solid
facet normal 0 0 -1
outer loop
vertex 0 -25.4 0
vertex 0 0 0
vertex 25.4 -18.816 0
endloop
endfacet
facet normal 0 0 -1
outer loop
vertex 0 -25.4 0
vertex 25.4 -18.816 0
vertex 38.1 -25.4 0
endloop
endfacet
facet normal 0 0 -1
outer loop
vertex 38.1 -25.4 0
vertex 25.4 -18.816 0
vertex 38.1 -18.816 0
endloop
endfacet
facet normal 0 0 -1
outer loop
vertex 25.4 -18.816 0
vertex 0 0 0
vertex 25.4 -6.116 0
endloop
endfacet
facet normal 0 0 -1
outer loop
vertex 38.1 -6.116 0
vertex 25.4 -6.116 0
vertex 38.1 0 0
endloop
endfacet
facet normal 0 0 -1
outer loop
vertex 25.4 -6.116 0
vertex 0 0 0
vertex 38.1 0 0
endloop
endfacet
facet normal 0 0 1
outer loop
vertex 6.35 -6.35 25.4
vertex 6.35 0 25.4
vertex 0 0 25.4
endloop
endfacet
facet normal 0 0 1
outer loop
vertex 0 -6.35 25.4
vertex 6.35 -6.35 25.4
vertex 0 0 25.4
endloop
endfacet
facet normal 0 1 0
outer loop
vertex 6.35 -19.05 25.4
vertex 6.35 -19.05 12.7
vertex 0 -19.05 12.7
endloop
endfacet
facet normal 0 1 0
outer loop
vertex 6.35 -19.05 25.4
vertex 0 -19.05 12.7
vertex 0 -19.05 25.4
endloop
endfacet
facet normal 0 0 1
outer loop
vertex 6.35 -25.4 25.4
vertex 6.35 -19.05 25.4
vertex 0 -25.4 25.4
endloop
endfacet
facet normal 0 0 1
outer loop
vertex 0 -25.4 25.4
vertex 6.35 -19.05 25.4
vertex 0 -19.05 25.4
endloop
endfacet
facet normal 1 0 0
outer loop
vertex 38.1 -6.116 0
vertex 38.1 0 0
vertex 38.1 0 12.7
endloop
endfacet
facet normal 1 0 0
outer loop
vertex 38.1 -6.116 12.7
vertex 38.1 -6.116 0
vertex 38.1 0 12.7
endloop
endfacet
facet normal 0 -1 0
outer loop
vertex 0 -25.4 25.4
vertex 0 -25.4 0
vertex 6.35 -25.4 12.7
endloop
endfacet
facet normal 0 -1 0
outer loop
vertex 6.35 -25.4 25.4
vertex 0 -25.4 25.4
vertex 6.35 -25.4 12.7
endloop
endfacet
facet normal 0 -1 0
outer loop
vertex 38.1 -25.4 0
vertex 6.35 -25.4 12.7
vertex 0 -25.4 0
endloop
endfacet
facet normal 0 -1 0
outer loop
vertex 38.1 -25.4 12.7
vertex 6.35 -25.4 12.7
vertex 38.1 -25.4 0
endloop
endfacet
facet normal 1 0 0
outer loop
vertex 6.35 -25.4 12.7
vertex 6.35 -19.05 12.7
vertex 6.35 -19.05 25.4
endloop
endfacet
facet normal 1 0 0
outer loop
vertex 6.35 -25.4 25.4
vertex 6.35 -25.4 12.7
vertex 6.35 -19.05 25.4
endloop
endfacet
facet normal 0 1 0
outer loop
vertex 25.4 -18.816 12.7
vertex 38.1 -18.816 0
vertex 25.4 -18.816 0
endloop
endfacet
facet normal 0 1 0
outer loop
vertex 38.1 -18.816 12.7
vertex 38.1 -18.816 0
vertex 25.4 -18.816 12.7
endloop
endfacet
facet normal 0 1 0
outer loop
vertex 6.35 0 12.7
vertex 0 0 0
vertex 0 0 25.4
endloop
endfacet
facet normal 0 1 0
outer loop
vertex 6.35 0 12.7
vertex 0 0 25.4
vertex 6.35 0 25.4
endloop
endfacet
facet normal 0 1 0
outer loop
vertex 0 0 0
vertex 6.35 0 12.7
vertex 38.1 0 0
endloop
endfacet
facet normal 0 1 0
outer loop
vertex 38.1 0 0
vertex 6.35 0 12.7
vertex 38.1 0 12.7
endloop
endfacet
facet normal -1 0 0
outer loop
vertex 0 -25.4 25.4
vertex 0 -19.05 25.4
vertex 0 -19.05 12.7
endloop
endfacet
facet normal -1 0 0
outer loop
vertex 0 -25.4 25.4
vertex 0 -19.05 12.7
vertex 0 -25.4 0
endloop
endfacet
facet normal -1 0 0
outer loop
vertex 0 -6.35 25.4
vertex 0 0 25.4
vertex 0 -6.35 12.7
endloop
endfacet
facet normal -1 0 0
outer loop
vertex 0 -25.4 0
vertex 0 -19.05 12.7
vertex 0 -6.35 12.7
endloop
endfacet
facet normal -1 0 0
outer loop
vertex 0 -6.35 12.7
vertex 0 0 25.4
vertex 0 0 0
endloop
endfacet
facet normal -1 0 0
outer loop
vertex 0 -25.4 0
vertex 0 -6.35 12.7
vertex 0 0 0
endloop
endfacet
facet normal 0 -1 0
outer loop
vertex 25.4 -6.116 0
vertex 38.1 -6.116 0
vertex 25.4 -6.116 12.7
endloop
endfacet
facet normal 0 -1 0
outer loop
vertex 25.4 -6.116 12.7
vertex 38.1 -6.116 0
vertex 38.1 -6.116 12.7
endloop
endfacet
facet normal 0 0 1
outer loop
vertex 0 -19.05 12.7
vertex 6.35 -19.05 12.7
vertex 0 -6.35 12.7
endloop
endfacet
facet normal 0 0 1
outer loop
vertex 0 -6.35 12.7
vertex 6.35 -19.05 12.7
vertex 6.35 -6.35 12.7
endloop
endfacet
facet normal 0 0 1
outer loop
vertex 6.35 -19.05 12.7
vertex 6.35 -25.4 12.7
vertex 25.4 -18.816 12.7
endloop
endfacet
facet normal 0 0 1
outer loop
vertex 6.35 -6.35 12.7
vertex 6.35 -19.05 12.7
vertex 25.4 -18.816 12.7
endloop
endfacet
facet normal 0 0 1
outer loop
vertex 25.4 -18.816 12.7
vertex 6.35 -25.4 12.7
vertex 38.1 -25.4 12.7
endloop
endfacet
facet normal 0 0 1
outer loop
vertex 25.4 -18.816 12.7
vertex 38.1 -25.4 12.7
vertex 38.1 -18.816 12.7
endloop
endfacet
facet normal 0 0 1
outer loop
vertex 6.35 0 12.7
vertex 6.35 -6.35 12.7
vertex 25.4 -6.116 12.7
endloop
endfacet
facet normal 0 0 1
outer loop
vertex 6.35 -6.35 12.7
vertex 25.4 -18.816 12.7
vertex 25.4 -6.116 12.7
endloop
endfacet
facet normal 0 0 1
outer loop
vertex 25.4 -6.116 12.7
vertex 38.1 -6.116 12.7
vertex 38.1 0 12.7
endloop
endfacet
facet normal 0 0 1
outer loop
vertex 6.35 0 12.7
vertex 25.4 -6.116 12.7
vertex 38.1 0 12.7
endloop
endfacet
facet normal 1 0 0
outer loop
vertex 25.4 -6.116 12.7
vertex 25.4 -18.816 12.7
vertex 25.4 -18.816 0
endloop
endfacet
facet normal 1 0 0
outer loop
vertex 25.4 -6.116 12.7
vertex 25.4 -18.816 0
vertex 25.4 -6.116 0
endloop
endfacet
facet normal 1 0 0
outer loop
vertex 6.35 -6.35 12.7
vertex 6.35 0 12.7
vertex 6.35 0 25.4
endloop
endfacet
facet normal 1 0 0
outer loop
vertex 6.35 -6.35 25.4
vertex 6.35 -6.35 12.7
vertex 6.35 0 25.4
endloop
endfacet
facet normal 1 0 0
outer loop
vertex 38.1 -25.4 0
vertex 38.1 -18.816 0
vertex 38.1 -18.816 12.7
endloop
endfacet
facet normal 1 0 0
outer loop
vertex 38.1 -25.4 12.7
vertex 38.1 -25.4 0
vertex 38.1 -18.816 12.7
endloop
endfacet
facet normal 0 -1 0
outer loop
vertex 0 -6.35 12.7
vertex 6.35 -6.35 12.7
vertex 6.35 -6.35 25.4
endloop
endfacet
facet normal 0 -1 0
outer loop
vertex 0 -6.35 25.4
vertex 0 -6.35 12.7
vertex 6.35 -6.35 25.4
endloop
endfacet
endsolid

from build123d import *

# Parameters (mm, degrees)
F1_DEPTH = 25.4
F2_W     = 12.7
F2_H     = 12.7
F3_DEPTH = 25.4
F4_W     = 12.7
F4_H     = 12.7
F5_DEPTH = 12.7


with BuildPart() as f1:
    # F0 (on Front) → F1 (new body)
    with BuildSketch(Plane.XZ):
        Polygon((0, 25.4), (0, 0), (38.1, 0), (38.1, 12.7), (6.35, 12.7), (6.35, 25.4), align=None)
    extrude(amount=F1_DEPTH)

    # F2 (on face) → F3 (cut)
    with BuildSketch(Plane.YZ.offset(6.35)):
        with Locations((-12.7, 19.05)):
            Rectangle(F2_W, F2_H)
    extrude(amount=-F3_DEPTH, mode=Mode.SUBTRACT)

    # F4 (on face) → F5 (cut)
    with BuildSketch(Plane.YZ.offset(38.1)):
        with Locations((-12.466443, 6.35)):
            Rectangle(F4_W, F4_H)
    extrude(amount=-F5_DEPTH, mode=Mode.SUBTRACT)


solid = f1.part
